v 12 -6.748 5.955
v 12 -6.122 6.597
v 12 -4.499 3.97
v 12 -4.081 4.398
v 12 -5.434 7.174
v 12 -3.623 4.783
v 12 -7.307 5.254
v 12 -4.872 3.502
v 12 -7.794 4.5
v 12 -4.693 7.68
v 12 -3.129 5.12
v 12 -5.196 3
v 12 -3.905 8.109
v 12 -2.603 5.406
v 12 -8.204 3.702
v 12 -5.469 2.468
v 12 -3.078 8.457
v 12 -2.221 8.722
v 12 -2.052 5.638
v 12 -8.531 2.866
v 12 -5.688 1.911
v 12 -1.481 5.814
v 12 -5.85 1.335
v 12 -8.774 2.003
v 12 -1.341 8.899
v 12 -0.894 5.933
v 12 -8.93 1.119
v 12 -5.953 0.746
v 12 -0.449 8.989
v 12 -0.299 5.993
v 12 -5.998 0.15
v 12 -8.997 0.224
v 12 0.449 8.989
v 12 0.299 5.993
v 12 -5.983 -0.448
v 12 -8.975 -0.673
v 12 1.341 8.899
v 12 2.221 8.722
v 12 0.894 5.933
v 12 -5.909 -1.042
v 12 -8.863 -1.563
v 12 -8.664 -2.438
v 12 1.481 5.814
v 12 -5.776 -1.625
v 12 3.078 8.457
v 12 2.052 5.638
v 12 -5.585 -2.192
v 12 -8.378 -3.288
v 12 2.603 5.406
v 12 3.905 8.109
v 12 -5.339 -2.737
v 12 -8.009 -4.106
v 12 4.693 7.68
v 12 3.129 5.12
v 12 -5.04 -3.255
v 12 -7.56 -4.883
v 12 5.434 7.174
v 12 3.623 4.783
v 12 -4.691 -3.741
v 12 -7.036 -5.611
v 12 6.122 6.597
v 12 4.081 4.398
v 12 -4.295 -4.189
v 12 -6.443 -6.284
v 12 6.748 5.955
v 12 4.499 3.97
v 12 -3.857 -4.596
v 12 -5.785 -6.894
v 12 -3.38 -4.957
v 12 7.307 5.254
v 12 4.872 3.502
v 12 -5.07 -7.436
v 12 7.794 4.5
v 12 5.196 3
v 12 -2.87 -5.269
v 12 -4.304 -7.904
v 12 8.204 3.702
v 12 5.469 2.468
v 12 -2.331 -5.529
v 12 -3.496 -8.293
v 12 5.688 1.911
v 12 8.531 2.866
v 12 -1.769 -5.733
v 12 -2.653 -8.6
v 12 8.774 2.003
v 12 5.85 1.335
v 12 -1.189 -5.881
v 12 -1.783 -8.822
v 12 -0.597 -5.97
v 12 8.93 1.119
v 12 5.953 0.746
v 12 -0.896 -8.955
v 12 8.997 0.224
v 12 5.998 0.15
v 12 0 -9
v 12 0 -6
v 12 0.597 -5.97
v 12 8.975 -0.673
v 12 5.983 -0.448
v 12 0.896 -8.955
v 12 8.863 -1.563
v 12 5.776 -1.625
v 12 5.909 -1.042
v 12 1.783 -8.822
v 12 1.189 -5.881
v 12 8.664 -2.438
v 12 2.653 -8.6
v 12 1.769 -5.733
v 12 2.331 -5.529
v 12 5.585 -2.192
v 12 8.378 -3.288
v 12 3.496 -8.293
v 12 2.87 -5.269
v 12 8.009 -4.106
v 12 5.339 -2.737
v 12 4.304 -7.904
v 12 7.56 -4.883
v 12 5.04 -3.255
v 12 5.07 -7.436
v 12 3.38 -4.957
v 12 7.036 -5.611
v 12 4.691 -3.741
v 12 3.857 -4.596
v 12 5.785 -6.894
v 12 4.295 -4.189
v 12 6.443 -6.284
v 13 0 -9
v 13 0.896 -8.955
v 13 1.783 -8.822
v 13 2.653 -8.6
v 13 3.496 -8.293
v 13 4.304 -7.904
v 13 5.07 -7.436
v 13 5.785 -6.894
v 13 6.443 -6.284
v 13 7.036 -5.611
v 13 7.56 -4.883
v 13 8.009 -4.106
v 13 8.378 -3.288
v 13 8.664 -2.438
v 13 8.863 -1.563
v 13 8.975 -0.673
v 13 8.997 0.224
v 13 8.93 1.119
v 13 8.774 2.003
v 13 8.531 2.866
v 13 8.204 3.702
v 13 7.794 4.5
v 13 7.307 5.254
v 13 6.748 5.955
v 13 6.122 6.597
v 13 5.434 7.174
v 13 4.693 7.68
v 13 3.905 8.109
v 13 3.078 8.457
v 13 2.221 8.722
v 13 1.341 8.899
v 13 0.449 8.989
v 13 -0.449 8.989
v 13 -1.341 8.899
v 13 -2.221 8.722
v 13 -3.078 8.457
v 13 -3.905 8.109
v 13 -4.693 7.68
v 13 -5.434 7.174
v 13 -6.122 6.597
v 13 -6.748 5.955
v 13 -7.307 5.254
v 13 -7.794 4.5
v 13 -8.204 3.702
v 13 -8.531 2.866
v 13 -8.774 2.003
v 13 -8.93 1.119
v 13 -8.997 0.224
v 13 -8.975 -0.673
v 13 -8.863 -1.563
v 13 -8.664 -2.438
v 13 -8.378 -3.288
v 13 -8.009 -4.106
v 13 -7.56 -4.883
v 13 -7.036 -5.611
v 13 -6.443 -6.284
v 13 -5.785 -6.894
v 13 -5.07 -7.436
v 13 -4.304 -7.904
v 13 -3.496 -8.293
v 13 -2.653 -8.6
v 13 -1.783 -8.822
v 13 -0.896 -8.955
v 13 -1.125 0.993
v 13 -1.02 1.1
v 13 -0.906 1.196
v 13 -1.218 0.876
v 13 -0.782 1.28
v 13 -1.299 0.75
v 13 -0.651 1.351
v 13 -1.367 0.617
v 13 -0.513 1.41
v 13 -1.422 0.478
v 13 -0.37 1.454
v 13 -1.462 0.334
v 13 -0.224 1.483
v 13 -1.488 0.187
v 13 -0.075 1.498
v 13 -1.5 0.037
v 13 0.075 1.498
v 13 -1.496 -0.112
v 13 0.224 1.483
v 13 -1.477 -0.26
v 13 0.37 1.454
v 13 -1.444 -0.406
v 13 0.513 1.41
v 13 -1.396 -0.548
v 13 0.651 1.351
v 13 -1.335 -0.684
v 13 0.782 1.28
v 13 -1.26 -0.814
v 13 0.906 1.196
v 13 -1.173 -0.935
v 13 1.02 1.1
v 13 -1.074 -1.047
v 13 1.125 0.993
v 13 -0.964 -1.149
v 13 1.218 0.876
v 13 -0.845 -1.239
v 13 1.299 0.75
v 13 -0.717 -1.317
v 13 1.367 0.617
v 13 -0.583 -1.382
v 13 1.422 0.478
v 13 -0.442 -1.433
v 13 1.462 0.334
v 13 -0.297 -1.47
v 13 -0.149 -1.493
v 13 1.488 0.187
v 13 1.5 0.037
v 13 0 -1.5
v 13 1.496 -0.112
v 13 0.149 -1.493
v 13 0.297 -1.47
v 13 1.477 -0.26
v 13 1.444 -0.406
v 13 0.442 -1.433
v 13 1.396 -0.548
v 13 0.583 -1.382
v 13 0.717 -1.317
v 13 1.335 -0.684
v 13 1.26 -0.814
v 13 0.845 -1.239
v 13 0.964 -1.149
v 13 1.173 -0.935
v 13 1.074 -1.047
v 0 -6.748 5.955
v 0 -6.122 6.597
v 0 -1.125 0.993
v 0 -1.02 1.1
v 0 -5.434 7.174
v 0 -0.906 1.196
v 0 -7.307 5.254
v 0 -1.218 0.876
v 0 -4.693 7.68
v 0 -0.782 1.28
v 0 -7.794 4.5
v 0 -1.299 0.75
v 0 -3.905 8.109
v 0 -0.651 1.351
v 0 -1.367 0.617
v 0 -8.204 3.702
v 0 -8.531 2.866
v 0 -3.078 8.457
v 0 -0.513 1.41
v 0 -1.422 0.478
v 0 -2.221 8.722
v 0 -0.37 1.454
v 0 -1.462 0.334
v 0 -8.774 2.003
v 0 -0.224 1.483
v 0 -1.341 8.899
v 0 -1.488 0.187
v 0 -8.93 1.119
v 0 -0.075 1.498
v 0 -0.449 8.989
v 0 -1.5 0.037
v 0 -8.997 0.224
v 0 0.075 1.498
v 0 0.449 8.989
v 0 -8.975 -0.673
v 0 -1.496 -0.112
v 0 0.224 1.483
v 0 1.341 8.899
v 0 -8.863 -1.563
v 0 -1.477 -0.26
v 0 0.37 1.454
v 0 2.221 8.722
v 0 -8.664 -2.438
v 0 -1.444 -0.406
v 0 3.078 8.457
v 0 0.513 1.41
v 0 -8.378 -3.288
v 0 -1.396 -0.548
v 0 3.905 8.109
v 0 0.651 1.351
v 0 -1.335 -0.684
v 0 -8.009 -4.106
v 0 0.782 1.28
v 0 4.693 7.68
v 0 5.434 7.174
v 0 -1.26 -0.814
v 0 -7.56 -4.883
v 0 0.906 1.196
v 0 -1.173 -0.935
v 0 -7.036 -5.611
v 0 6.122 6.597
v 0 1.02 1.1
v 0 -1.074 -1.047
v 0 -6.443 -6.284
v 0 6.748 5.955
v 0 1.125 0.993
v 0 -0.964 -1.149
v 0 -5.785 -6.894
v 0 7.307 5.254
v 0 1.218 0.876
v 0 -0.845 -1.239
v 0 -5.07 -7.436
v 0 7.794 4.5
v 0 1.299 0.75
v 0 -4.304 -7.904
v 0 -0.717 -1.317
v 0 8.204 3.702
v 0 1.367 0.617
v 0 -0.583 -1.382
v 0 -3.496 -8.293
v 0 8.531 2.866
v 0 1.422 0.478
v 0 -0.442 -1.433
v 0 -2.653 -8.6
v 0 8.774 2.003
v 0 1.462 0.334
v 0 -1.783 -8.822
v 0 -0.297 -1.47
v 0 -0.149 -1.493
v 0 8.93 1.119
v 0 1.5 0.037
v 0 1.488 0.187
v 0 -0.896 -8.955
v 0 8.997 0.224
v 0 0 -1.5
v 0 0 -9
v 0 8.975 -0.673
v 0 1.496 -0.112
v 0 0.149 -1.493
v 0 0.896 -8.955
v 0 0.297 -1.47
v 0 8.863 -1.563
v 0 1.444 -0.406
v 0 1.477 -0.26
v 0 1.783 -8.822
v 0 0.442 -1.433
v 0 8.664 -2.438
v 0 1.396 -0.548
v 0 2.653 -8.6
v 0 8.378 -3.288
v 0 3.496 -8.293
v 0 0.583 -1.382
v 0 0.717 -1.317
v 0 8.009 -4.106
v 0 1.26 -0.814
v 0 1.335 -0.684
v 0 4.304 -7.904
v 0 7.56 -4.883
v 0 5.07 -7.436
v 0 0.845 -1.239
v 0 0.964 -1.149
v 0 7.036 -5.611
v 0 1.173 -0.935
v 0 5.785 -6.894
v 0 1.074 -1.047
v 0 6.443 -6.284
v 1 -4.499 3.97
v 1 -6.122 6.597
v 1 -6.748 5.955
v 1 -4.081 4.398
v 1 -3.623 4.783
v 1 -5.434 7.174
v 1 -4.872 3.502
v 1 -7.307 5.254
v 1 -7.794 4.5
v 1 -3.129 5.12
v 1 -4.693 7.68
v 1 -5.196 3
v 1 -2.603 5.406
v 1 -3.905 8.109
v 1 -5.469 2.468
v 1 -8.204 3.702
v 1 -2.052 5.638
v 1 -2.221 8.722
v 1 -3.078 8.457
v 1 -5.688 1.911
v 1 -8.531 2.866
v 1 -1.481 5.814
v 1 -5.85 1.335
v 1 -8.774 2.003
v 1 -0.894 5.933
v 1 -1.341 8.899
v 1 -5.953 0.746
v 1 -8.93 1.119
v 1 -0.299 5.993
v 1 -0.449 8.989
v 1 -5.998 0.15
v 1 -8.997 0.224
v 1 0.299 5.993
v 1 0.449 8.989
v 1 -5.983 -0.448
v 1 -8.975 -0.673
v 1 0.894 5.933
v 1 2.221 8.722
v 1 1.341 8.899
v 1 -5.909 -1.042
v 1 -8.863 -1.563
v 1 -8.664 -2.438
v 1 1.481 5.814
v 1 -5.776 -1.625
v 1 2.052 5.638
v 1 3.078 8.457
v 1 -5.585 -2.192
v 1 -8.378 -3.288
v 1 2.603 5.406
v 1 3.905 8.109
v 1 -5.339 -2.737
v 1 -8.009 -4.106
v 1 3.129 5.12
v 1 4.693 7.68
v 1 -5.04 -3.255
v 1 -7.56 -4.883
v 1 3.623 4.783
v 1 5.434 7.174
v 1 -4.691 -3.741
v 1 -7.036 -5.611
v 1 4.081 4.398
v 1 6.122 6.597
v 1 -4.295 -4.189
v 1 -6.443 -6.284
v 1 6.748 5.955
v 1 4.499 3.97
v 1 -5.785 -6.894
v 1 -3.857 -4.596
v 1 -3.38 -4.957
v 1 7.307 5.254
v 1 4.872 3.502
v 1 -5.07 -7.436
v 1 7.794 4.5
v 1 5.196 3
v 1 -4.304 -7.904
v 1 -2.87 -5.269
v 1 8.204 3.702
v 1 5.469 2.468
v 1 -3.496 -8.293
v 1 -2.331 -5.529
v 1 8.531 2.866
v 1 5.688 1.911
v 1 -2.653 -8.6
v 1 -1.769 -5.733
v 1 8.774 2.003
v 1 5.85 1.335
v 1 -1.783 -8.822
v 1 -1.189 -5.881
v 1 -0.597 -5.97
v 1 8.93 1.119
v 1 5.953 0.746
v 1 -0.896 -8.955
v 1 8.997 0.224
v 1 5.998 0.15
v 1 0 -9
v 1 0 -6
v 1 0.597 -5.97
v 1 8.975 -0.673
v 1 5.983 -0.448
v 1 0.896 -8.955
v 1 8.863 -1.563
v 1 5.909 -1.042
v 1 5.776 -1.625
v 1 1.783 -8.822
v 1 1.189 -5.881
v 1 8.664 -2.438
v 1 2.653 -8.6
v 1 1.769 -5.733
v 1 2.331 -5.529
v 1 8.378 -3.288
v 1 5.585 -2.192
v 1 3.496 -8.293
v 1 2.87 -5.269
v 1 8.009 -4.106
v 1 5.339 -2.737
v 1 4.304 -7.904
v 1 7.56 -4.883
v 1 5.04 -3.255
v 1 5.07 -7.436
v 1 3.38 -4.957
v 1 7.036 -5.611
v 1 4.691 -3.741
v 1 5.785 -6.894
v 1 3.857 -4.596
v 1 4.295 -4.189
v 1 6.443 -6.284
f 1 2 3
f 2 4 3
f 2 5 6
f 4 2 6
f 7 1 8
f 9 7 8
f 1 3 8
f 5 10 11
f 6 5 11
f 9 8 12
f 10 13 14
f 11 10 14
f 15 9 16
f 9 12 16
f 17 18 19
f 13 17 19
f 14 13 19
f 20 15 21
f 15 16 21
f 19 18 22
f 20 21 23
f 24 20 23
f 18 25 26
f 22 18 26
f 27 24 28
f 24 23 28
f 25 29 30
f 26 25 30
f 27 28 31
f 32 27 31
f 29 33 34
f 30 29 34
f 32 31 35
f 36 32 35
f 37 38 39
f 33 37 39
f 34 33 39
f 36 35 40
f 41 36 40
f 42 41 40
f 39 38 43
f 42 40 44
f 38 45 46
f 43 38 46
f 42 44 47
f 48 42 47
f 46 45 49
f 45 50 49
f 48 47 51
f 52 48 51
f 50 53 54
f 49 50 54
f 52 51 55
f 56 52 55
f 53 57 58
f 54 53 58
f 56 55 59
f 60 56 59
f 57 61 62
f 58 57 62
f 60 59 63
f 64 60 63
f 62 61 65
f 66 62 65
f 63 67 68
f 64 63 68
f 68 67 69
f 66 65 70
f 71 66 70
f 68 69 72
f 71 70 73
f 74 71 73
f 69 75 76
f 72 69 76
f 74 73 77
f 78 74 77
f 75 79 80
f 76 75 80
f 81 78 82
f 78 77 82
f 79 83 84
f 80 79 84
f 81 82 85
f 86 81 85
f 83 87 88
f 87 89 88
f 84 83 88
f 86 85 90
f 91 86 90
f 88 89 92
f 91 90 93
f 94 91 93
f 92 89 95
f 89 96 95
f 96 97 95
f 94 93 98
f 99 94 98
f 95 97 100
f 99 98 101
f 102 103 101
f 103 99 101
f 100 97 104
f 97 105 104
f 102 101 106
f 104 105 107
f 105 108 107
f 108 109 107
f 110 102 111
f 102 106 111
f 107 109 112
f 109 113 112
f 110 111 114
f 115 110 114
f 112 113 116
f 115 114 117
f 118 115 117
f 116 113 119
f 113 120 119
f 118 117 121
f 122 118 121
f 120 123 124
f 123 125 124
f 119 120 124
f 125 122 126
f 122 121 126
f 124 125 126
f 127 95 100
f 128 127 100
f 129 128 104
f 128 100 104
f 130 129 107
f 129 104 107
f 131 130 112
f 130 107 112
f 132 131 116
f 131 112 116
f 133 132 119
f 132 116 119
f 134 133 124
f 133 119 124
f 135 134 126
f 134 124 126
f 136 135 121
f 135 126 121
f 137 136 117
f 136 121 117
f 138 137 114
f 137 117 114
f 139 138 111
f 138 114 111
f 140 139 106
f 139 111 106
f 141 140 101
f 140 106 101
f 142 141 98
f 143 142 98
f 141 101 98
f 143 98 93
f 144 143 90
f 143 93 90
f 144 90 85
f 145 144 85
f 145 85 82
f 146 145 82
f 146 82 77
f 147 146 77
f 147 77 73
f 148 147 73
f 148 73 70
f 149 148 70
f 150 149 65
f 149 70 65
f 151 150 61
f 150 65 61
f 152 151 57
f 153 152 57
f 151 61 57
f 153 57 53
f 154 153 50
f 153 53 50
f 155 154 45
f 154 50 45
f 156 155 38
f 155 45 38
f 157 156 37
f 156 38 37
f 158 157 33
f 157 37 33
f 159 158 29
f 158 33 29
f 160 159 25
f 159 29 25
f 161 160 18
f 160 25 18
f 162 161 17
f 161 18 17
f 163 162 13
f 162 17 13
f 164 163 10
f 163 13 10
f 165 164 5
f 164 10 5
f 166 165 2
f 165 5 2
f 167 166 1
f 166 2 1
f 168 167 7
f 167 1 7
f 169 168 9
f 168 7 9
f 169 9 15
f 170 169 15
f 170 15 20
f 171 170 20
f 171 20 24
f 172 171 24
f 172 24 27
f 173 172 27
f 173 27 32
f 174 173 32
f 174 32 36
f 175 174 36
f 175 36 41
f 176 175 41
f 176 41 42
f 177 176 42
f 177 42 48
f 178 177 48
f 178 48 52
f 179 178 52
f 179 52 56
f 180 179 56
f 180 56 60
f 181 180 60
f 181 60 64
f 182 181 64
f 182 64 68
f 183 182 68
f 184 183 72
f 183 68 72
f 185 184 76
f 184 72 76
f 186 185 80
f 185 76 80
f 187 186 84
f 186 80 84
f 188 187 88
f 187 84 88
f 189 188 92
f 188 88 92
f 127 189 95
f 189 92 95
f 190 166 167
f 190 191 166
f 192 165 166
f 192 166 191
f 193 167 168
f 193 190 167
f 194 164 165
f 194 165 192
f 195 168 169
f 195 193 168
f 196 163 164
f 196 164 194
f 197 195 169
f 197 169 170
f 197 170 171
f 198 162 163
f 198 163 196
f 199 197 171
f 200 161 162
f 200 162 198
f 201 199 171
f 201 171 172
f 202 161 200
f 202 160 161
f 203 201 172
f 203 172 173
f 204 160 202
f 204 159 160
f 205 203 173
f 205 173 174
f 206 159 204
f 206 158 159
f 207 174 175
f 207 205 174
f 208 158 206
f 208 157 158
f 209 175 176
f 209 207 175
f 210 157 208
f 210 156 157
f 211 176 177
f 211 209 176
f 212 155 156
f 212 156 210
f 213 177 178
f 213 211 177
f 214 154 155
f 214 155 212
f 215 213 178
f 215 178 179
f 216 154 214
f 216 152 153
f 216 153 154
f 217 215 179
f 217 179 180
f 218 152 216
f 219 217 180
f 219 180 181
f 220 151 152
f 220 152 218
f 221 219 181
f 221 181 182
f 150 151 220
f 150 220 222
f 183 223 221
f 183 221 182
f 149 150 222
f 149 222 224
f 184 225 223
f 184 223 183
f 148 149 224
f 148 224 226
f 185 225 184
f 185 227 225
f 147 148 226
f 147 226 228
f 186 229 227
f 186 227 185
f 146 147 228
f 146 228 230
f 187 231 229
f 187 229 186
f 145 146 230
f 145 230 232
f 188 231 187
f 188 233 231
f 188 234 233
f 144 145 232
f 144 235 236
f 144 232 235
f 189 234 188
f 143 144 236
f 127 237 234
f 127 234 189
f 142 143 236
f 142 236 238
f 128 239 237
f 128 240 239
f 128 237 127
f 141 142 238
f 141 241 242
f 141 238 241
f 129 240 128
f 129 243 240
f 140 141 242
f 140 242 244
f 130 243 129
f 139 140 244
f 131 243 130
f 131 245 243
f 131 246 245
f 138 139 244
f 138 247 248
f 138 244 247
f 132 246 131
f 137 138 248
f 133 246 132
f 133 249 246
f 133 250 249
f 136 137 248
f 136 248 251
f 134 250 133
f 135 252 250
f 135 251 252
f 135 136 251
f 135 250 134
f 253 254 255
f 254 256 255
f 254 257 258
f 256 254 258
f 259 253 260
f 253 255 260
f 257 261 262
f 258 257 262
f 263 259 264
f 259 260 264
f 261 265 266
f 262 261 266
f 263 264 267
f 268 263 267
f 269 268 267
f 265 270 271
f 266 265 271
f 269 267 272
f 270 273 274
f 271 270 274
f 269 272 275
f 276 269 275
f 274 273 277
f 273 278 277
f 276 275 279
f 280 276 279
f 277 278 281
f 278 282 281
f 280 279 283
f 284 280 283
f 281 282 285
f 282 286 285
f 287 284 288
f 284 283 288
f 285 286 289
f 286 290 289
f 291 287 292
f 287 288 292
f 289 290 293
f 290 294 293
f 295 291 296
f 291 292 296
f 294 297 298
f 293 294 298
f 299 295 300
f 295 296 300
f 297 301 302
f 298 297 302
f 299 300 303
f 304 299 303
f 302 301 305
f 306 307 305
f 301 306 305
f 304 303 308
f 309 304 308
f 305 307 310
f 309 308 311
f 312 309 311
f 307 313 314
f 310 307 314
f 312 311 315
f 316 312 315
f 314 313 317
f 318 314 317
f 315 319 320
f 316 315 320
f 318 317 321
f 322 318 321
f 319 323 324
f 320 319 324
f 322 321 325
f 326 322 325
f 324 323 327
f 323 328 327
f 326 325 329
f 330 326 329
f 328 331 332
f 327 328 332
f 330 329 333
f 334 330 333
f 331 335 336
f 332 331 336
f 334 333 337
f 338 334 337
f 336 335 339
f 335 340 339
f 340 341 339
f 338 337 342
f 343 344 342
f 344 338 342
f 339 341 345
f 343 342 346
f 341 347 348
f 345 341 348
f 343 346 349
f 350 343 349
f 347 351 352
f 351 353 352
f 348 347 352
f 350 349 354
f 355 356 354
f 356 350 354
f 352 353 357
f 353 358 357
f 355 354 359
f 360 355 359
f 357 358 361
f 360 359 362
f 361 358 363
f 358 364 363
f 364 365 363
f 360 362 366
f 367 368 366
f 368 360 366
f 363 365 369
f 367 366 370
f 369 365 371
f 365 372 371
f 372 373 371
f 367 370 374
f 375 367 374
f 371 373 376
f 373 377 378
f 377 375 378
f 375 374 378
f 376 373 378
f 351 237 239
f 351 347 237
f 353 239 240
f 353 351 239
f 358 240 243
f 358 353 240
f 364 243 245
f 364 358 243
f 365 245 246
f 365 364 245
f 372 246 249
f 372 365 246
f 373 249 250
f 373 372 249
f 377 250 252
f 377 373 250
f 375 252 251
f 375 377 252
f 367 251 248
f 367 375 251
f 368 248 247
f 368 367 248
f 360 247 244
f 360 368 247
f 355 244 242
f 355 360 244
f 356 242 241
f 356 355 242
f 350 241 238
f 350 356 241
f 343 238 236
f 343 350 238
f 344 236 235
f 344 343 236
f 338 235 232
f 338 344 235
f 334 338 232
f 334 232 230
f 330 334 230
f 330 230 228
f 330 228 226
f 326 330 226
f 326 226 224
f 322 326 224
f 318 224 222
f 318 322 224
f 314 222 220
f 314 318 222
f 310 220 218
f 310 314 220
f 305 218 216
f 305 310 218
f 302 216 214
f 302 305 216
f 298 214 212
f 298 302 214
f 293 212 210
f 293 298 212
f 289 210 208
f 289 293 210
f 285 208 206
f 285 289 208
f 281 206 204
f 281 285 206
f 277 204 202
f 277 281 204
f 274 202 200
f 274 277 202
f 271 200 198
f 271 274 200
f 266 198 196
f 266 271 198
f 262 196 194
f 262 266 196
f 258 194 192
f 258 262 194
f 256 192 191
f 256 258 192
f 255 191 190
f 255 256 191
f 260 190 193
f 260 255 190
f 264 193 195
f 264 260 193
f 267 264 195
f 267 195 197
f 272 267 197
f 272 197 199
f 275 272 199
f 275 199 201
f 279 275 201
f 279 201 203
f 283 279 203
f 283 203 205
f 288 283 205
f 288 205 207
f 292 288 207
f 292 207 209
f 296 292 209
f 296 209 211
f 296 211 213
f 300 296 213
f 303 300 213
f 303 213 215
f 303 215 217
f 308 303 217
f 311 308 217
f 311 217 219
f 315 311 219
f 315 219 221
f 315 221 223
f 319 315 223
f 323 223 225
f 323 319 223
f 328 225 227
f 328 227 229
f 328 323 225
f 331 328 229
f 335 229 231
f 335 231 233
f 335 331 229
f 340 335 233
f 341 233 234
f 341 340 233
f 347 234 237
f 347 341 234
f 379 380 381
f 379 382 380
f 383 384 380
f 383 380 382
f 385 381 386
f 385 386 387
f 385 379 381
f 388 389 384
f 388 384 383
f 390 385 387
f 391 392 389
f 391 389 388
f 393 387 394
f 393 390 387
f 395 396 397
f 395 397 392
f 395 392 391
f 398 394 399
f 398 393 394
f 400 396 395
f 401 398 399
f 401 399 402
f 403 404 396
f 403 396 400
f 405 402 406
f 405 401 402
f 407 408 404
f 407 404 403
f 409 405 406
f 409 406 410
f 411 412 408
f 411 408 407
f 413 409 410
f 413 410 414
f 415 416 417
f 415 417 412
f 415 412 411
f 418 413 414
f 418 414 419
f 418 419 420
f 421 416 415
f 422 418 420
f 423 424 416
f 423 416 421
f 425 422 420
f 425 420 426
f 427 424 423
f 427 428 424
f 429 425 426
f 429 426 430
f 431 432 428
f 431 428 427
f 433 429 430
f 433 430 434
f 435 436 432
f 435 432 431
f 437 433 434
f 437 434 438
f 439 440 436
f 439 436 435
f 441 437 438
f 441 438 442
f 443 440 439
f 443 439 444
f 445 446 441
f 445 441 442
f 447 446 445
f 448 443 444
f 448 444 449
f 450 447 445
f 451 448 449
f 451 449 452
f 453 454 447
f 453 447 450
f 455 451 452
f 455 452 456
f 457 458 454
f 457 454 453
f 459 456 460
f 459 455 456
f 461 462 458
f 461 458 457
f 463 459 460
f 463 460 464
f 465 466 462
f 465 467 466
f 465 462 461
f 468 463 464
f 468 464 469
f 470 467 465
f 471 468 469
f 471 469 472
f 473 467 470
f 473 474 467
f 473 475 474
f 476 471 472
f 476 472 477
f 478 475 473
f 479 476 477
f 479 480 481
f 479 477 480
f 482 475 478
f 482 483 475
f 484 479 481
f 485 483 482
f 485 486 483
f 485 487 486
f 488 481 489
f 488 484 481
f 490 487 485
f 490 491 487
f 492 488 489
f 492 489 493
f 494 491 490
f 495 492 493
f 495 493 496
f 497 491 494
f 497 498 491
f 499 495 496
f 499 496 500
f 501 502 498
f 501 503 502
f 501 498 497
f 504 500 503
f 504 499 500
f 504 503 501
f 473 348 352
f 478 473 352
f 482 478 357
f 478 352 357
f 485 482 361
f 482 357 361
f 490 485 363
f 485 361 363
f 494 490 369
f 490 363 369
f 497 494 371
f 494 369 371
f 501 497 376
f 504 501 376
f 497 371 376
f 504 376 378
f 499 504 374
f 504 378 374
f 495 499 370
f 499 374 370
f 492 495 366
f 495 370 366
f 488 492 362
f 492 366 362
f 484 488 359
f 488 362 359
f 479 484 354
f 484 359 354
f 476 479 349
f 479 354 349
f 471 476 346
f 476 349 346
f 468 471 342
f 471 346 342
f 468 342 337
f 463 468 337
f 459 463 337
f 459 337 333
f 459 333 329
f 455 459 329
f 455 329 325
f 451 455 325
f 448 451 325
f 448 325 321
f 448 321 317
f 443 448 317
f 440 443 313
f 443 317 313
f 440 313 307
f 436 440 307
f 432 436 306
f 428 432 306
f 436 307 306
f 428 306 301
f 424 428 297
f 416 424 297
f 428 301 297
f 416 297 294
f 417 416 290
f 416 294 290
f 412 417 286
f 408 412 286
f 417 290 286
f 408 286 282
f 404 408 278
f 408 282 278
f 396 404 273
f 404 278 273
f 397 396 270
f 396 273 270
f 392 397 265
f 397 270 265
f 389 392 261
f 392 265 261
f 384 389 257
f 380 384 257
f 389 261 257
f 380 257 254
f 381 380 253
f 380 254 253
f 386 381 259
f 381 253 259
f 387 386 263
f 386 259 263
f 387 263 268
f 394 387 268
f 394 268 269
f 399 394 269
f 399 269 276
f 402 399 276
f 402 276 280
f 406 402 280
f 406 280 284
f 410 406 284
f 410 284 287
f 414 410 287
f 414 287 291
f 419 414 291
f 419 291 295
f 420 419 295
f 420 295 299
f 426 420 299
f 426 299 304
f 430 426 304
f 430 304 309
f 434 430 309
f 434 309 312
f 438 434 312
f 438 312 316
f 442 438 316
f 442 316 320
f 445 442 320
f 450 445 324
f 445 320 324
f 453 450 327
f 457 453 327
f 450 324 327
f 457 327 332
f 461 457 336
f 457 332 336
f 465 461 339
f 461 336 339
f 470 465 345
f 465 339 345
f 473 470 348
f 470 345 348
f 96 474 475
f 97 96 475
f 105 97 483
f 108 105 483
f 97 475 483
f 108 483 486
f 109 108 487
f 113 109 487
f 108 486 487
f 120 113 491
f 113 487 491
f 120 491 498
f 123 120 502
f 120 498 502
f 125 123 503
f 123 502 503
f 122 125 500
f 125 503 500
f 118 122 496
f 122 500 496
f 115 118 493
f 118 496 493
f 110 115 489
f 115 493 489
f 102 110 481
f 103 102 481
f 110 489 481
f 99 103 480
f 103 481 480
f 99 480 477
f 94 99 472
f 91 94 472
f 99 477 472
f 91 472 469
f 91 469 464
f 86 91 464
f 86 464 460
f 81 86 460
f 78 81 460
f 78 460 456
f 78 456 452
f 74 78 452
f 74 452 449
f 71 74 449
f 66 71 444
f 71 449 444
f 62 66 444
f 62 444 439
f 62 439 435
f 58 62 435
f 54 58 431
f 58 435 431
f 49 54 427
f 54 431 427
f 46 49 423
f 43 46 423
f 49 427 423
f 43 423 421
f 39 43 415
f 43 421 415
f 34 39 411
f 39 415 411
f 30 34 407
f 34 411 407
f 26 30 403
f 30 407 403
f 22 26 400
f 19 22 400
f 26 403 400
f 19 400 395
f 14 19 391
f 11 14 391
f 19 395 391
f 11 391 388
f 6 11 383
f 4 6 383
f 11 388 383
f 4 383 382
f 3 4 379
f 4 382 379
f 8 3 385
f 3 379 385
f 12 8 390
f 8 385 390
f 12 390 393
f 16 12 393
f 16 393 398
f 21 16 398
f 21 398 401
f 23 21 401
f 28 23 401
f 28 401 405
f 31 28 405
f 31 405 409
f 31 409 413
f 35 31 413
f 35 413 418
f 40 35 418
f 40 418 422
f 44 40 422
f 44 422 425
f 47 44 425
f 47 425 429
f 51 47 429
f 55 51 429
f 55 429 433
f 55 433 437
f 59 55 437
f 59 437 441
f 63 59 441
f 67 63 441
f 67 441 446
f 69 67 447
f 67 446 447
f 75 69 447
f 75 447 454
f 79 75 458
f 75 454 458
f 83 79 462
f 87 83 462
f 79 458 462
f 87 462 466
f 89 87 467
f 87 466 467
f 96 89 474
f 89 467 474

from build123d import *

# Parameters (mm, degrees)
SKETCH1_R           = 9
SKETCH1_R_2         = 1.5
BOSS_EXTRUDE1_DEPTH = 1
SKETCH2_R           = 6
SKETCH2_R_2         = 1.5
BOSS_EXTRUDE2_DEPTH = 11
SKETCH3_R           = 9
SKETCH3_R_2         = 1.5
BOSS_EXTRUDE3_DEPTH = 1


with BuildPart() as part:
    # Sketch1 → Boss-Extrude1 (new body)
    with BuildSketch(Plane(origin=(0, 0, 0), x_dir=(0, 0, -1), z_dir=(1, 0, 0))):
        Circle(SKETCH1_R)
        Circle(SKETCH1_R_2, mode=Mode.SUBTRACT)
    extrude(amount=BOSS_EXTRUDE1_DEPTH)

    # Sketch2 → Boss-Extrude2 (add)
    with BuildSketch(Plane(origin=(1, 0, 0), x_dir=(0, 0, -1), z_dir=(1, 0, 0))):
        Circle(SKETCH2_R)
        Circle(SKETCH2_R_2, mode=Mode.SUBTRACT)
    extrude(amount=BOSS_EXTRUDE2_DEPTH)

    # Sketch3 → Boss-Extrude3 (add)
    with BuildSketch(Plane(origin=(12, 0, 0), x_dir=(0, 0, -1), z_dir=(1, 0, 0))):
        Circle(SKETCH3_R)
        Circle(SKETCH3_R_2, mode=Mode.SUBTRACT)
    extrude(amount=BOSS_EXTRUDE3_DEPTH)


solid = part.part
